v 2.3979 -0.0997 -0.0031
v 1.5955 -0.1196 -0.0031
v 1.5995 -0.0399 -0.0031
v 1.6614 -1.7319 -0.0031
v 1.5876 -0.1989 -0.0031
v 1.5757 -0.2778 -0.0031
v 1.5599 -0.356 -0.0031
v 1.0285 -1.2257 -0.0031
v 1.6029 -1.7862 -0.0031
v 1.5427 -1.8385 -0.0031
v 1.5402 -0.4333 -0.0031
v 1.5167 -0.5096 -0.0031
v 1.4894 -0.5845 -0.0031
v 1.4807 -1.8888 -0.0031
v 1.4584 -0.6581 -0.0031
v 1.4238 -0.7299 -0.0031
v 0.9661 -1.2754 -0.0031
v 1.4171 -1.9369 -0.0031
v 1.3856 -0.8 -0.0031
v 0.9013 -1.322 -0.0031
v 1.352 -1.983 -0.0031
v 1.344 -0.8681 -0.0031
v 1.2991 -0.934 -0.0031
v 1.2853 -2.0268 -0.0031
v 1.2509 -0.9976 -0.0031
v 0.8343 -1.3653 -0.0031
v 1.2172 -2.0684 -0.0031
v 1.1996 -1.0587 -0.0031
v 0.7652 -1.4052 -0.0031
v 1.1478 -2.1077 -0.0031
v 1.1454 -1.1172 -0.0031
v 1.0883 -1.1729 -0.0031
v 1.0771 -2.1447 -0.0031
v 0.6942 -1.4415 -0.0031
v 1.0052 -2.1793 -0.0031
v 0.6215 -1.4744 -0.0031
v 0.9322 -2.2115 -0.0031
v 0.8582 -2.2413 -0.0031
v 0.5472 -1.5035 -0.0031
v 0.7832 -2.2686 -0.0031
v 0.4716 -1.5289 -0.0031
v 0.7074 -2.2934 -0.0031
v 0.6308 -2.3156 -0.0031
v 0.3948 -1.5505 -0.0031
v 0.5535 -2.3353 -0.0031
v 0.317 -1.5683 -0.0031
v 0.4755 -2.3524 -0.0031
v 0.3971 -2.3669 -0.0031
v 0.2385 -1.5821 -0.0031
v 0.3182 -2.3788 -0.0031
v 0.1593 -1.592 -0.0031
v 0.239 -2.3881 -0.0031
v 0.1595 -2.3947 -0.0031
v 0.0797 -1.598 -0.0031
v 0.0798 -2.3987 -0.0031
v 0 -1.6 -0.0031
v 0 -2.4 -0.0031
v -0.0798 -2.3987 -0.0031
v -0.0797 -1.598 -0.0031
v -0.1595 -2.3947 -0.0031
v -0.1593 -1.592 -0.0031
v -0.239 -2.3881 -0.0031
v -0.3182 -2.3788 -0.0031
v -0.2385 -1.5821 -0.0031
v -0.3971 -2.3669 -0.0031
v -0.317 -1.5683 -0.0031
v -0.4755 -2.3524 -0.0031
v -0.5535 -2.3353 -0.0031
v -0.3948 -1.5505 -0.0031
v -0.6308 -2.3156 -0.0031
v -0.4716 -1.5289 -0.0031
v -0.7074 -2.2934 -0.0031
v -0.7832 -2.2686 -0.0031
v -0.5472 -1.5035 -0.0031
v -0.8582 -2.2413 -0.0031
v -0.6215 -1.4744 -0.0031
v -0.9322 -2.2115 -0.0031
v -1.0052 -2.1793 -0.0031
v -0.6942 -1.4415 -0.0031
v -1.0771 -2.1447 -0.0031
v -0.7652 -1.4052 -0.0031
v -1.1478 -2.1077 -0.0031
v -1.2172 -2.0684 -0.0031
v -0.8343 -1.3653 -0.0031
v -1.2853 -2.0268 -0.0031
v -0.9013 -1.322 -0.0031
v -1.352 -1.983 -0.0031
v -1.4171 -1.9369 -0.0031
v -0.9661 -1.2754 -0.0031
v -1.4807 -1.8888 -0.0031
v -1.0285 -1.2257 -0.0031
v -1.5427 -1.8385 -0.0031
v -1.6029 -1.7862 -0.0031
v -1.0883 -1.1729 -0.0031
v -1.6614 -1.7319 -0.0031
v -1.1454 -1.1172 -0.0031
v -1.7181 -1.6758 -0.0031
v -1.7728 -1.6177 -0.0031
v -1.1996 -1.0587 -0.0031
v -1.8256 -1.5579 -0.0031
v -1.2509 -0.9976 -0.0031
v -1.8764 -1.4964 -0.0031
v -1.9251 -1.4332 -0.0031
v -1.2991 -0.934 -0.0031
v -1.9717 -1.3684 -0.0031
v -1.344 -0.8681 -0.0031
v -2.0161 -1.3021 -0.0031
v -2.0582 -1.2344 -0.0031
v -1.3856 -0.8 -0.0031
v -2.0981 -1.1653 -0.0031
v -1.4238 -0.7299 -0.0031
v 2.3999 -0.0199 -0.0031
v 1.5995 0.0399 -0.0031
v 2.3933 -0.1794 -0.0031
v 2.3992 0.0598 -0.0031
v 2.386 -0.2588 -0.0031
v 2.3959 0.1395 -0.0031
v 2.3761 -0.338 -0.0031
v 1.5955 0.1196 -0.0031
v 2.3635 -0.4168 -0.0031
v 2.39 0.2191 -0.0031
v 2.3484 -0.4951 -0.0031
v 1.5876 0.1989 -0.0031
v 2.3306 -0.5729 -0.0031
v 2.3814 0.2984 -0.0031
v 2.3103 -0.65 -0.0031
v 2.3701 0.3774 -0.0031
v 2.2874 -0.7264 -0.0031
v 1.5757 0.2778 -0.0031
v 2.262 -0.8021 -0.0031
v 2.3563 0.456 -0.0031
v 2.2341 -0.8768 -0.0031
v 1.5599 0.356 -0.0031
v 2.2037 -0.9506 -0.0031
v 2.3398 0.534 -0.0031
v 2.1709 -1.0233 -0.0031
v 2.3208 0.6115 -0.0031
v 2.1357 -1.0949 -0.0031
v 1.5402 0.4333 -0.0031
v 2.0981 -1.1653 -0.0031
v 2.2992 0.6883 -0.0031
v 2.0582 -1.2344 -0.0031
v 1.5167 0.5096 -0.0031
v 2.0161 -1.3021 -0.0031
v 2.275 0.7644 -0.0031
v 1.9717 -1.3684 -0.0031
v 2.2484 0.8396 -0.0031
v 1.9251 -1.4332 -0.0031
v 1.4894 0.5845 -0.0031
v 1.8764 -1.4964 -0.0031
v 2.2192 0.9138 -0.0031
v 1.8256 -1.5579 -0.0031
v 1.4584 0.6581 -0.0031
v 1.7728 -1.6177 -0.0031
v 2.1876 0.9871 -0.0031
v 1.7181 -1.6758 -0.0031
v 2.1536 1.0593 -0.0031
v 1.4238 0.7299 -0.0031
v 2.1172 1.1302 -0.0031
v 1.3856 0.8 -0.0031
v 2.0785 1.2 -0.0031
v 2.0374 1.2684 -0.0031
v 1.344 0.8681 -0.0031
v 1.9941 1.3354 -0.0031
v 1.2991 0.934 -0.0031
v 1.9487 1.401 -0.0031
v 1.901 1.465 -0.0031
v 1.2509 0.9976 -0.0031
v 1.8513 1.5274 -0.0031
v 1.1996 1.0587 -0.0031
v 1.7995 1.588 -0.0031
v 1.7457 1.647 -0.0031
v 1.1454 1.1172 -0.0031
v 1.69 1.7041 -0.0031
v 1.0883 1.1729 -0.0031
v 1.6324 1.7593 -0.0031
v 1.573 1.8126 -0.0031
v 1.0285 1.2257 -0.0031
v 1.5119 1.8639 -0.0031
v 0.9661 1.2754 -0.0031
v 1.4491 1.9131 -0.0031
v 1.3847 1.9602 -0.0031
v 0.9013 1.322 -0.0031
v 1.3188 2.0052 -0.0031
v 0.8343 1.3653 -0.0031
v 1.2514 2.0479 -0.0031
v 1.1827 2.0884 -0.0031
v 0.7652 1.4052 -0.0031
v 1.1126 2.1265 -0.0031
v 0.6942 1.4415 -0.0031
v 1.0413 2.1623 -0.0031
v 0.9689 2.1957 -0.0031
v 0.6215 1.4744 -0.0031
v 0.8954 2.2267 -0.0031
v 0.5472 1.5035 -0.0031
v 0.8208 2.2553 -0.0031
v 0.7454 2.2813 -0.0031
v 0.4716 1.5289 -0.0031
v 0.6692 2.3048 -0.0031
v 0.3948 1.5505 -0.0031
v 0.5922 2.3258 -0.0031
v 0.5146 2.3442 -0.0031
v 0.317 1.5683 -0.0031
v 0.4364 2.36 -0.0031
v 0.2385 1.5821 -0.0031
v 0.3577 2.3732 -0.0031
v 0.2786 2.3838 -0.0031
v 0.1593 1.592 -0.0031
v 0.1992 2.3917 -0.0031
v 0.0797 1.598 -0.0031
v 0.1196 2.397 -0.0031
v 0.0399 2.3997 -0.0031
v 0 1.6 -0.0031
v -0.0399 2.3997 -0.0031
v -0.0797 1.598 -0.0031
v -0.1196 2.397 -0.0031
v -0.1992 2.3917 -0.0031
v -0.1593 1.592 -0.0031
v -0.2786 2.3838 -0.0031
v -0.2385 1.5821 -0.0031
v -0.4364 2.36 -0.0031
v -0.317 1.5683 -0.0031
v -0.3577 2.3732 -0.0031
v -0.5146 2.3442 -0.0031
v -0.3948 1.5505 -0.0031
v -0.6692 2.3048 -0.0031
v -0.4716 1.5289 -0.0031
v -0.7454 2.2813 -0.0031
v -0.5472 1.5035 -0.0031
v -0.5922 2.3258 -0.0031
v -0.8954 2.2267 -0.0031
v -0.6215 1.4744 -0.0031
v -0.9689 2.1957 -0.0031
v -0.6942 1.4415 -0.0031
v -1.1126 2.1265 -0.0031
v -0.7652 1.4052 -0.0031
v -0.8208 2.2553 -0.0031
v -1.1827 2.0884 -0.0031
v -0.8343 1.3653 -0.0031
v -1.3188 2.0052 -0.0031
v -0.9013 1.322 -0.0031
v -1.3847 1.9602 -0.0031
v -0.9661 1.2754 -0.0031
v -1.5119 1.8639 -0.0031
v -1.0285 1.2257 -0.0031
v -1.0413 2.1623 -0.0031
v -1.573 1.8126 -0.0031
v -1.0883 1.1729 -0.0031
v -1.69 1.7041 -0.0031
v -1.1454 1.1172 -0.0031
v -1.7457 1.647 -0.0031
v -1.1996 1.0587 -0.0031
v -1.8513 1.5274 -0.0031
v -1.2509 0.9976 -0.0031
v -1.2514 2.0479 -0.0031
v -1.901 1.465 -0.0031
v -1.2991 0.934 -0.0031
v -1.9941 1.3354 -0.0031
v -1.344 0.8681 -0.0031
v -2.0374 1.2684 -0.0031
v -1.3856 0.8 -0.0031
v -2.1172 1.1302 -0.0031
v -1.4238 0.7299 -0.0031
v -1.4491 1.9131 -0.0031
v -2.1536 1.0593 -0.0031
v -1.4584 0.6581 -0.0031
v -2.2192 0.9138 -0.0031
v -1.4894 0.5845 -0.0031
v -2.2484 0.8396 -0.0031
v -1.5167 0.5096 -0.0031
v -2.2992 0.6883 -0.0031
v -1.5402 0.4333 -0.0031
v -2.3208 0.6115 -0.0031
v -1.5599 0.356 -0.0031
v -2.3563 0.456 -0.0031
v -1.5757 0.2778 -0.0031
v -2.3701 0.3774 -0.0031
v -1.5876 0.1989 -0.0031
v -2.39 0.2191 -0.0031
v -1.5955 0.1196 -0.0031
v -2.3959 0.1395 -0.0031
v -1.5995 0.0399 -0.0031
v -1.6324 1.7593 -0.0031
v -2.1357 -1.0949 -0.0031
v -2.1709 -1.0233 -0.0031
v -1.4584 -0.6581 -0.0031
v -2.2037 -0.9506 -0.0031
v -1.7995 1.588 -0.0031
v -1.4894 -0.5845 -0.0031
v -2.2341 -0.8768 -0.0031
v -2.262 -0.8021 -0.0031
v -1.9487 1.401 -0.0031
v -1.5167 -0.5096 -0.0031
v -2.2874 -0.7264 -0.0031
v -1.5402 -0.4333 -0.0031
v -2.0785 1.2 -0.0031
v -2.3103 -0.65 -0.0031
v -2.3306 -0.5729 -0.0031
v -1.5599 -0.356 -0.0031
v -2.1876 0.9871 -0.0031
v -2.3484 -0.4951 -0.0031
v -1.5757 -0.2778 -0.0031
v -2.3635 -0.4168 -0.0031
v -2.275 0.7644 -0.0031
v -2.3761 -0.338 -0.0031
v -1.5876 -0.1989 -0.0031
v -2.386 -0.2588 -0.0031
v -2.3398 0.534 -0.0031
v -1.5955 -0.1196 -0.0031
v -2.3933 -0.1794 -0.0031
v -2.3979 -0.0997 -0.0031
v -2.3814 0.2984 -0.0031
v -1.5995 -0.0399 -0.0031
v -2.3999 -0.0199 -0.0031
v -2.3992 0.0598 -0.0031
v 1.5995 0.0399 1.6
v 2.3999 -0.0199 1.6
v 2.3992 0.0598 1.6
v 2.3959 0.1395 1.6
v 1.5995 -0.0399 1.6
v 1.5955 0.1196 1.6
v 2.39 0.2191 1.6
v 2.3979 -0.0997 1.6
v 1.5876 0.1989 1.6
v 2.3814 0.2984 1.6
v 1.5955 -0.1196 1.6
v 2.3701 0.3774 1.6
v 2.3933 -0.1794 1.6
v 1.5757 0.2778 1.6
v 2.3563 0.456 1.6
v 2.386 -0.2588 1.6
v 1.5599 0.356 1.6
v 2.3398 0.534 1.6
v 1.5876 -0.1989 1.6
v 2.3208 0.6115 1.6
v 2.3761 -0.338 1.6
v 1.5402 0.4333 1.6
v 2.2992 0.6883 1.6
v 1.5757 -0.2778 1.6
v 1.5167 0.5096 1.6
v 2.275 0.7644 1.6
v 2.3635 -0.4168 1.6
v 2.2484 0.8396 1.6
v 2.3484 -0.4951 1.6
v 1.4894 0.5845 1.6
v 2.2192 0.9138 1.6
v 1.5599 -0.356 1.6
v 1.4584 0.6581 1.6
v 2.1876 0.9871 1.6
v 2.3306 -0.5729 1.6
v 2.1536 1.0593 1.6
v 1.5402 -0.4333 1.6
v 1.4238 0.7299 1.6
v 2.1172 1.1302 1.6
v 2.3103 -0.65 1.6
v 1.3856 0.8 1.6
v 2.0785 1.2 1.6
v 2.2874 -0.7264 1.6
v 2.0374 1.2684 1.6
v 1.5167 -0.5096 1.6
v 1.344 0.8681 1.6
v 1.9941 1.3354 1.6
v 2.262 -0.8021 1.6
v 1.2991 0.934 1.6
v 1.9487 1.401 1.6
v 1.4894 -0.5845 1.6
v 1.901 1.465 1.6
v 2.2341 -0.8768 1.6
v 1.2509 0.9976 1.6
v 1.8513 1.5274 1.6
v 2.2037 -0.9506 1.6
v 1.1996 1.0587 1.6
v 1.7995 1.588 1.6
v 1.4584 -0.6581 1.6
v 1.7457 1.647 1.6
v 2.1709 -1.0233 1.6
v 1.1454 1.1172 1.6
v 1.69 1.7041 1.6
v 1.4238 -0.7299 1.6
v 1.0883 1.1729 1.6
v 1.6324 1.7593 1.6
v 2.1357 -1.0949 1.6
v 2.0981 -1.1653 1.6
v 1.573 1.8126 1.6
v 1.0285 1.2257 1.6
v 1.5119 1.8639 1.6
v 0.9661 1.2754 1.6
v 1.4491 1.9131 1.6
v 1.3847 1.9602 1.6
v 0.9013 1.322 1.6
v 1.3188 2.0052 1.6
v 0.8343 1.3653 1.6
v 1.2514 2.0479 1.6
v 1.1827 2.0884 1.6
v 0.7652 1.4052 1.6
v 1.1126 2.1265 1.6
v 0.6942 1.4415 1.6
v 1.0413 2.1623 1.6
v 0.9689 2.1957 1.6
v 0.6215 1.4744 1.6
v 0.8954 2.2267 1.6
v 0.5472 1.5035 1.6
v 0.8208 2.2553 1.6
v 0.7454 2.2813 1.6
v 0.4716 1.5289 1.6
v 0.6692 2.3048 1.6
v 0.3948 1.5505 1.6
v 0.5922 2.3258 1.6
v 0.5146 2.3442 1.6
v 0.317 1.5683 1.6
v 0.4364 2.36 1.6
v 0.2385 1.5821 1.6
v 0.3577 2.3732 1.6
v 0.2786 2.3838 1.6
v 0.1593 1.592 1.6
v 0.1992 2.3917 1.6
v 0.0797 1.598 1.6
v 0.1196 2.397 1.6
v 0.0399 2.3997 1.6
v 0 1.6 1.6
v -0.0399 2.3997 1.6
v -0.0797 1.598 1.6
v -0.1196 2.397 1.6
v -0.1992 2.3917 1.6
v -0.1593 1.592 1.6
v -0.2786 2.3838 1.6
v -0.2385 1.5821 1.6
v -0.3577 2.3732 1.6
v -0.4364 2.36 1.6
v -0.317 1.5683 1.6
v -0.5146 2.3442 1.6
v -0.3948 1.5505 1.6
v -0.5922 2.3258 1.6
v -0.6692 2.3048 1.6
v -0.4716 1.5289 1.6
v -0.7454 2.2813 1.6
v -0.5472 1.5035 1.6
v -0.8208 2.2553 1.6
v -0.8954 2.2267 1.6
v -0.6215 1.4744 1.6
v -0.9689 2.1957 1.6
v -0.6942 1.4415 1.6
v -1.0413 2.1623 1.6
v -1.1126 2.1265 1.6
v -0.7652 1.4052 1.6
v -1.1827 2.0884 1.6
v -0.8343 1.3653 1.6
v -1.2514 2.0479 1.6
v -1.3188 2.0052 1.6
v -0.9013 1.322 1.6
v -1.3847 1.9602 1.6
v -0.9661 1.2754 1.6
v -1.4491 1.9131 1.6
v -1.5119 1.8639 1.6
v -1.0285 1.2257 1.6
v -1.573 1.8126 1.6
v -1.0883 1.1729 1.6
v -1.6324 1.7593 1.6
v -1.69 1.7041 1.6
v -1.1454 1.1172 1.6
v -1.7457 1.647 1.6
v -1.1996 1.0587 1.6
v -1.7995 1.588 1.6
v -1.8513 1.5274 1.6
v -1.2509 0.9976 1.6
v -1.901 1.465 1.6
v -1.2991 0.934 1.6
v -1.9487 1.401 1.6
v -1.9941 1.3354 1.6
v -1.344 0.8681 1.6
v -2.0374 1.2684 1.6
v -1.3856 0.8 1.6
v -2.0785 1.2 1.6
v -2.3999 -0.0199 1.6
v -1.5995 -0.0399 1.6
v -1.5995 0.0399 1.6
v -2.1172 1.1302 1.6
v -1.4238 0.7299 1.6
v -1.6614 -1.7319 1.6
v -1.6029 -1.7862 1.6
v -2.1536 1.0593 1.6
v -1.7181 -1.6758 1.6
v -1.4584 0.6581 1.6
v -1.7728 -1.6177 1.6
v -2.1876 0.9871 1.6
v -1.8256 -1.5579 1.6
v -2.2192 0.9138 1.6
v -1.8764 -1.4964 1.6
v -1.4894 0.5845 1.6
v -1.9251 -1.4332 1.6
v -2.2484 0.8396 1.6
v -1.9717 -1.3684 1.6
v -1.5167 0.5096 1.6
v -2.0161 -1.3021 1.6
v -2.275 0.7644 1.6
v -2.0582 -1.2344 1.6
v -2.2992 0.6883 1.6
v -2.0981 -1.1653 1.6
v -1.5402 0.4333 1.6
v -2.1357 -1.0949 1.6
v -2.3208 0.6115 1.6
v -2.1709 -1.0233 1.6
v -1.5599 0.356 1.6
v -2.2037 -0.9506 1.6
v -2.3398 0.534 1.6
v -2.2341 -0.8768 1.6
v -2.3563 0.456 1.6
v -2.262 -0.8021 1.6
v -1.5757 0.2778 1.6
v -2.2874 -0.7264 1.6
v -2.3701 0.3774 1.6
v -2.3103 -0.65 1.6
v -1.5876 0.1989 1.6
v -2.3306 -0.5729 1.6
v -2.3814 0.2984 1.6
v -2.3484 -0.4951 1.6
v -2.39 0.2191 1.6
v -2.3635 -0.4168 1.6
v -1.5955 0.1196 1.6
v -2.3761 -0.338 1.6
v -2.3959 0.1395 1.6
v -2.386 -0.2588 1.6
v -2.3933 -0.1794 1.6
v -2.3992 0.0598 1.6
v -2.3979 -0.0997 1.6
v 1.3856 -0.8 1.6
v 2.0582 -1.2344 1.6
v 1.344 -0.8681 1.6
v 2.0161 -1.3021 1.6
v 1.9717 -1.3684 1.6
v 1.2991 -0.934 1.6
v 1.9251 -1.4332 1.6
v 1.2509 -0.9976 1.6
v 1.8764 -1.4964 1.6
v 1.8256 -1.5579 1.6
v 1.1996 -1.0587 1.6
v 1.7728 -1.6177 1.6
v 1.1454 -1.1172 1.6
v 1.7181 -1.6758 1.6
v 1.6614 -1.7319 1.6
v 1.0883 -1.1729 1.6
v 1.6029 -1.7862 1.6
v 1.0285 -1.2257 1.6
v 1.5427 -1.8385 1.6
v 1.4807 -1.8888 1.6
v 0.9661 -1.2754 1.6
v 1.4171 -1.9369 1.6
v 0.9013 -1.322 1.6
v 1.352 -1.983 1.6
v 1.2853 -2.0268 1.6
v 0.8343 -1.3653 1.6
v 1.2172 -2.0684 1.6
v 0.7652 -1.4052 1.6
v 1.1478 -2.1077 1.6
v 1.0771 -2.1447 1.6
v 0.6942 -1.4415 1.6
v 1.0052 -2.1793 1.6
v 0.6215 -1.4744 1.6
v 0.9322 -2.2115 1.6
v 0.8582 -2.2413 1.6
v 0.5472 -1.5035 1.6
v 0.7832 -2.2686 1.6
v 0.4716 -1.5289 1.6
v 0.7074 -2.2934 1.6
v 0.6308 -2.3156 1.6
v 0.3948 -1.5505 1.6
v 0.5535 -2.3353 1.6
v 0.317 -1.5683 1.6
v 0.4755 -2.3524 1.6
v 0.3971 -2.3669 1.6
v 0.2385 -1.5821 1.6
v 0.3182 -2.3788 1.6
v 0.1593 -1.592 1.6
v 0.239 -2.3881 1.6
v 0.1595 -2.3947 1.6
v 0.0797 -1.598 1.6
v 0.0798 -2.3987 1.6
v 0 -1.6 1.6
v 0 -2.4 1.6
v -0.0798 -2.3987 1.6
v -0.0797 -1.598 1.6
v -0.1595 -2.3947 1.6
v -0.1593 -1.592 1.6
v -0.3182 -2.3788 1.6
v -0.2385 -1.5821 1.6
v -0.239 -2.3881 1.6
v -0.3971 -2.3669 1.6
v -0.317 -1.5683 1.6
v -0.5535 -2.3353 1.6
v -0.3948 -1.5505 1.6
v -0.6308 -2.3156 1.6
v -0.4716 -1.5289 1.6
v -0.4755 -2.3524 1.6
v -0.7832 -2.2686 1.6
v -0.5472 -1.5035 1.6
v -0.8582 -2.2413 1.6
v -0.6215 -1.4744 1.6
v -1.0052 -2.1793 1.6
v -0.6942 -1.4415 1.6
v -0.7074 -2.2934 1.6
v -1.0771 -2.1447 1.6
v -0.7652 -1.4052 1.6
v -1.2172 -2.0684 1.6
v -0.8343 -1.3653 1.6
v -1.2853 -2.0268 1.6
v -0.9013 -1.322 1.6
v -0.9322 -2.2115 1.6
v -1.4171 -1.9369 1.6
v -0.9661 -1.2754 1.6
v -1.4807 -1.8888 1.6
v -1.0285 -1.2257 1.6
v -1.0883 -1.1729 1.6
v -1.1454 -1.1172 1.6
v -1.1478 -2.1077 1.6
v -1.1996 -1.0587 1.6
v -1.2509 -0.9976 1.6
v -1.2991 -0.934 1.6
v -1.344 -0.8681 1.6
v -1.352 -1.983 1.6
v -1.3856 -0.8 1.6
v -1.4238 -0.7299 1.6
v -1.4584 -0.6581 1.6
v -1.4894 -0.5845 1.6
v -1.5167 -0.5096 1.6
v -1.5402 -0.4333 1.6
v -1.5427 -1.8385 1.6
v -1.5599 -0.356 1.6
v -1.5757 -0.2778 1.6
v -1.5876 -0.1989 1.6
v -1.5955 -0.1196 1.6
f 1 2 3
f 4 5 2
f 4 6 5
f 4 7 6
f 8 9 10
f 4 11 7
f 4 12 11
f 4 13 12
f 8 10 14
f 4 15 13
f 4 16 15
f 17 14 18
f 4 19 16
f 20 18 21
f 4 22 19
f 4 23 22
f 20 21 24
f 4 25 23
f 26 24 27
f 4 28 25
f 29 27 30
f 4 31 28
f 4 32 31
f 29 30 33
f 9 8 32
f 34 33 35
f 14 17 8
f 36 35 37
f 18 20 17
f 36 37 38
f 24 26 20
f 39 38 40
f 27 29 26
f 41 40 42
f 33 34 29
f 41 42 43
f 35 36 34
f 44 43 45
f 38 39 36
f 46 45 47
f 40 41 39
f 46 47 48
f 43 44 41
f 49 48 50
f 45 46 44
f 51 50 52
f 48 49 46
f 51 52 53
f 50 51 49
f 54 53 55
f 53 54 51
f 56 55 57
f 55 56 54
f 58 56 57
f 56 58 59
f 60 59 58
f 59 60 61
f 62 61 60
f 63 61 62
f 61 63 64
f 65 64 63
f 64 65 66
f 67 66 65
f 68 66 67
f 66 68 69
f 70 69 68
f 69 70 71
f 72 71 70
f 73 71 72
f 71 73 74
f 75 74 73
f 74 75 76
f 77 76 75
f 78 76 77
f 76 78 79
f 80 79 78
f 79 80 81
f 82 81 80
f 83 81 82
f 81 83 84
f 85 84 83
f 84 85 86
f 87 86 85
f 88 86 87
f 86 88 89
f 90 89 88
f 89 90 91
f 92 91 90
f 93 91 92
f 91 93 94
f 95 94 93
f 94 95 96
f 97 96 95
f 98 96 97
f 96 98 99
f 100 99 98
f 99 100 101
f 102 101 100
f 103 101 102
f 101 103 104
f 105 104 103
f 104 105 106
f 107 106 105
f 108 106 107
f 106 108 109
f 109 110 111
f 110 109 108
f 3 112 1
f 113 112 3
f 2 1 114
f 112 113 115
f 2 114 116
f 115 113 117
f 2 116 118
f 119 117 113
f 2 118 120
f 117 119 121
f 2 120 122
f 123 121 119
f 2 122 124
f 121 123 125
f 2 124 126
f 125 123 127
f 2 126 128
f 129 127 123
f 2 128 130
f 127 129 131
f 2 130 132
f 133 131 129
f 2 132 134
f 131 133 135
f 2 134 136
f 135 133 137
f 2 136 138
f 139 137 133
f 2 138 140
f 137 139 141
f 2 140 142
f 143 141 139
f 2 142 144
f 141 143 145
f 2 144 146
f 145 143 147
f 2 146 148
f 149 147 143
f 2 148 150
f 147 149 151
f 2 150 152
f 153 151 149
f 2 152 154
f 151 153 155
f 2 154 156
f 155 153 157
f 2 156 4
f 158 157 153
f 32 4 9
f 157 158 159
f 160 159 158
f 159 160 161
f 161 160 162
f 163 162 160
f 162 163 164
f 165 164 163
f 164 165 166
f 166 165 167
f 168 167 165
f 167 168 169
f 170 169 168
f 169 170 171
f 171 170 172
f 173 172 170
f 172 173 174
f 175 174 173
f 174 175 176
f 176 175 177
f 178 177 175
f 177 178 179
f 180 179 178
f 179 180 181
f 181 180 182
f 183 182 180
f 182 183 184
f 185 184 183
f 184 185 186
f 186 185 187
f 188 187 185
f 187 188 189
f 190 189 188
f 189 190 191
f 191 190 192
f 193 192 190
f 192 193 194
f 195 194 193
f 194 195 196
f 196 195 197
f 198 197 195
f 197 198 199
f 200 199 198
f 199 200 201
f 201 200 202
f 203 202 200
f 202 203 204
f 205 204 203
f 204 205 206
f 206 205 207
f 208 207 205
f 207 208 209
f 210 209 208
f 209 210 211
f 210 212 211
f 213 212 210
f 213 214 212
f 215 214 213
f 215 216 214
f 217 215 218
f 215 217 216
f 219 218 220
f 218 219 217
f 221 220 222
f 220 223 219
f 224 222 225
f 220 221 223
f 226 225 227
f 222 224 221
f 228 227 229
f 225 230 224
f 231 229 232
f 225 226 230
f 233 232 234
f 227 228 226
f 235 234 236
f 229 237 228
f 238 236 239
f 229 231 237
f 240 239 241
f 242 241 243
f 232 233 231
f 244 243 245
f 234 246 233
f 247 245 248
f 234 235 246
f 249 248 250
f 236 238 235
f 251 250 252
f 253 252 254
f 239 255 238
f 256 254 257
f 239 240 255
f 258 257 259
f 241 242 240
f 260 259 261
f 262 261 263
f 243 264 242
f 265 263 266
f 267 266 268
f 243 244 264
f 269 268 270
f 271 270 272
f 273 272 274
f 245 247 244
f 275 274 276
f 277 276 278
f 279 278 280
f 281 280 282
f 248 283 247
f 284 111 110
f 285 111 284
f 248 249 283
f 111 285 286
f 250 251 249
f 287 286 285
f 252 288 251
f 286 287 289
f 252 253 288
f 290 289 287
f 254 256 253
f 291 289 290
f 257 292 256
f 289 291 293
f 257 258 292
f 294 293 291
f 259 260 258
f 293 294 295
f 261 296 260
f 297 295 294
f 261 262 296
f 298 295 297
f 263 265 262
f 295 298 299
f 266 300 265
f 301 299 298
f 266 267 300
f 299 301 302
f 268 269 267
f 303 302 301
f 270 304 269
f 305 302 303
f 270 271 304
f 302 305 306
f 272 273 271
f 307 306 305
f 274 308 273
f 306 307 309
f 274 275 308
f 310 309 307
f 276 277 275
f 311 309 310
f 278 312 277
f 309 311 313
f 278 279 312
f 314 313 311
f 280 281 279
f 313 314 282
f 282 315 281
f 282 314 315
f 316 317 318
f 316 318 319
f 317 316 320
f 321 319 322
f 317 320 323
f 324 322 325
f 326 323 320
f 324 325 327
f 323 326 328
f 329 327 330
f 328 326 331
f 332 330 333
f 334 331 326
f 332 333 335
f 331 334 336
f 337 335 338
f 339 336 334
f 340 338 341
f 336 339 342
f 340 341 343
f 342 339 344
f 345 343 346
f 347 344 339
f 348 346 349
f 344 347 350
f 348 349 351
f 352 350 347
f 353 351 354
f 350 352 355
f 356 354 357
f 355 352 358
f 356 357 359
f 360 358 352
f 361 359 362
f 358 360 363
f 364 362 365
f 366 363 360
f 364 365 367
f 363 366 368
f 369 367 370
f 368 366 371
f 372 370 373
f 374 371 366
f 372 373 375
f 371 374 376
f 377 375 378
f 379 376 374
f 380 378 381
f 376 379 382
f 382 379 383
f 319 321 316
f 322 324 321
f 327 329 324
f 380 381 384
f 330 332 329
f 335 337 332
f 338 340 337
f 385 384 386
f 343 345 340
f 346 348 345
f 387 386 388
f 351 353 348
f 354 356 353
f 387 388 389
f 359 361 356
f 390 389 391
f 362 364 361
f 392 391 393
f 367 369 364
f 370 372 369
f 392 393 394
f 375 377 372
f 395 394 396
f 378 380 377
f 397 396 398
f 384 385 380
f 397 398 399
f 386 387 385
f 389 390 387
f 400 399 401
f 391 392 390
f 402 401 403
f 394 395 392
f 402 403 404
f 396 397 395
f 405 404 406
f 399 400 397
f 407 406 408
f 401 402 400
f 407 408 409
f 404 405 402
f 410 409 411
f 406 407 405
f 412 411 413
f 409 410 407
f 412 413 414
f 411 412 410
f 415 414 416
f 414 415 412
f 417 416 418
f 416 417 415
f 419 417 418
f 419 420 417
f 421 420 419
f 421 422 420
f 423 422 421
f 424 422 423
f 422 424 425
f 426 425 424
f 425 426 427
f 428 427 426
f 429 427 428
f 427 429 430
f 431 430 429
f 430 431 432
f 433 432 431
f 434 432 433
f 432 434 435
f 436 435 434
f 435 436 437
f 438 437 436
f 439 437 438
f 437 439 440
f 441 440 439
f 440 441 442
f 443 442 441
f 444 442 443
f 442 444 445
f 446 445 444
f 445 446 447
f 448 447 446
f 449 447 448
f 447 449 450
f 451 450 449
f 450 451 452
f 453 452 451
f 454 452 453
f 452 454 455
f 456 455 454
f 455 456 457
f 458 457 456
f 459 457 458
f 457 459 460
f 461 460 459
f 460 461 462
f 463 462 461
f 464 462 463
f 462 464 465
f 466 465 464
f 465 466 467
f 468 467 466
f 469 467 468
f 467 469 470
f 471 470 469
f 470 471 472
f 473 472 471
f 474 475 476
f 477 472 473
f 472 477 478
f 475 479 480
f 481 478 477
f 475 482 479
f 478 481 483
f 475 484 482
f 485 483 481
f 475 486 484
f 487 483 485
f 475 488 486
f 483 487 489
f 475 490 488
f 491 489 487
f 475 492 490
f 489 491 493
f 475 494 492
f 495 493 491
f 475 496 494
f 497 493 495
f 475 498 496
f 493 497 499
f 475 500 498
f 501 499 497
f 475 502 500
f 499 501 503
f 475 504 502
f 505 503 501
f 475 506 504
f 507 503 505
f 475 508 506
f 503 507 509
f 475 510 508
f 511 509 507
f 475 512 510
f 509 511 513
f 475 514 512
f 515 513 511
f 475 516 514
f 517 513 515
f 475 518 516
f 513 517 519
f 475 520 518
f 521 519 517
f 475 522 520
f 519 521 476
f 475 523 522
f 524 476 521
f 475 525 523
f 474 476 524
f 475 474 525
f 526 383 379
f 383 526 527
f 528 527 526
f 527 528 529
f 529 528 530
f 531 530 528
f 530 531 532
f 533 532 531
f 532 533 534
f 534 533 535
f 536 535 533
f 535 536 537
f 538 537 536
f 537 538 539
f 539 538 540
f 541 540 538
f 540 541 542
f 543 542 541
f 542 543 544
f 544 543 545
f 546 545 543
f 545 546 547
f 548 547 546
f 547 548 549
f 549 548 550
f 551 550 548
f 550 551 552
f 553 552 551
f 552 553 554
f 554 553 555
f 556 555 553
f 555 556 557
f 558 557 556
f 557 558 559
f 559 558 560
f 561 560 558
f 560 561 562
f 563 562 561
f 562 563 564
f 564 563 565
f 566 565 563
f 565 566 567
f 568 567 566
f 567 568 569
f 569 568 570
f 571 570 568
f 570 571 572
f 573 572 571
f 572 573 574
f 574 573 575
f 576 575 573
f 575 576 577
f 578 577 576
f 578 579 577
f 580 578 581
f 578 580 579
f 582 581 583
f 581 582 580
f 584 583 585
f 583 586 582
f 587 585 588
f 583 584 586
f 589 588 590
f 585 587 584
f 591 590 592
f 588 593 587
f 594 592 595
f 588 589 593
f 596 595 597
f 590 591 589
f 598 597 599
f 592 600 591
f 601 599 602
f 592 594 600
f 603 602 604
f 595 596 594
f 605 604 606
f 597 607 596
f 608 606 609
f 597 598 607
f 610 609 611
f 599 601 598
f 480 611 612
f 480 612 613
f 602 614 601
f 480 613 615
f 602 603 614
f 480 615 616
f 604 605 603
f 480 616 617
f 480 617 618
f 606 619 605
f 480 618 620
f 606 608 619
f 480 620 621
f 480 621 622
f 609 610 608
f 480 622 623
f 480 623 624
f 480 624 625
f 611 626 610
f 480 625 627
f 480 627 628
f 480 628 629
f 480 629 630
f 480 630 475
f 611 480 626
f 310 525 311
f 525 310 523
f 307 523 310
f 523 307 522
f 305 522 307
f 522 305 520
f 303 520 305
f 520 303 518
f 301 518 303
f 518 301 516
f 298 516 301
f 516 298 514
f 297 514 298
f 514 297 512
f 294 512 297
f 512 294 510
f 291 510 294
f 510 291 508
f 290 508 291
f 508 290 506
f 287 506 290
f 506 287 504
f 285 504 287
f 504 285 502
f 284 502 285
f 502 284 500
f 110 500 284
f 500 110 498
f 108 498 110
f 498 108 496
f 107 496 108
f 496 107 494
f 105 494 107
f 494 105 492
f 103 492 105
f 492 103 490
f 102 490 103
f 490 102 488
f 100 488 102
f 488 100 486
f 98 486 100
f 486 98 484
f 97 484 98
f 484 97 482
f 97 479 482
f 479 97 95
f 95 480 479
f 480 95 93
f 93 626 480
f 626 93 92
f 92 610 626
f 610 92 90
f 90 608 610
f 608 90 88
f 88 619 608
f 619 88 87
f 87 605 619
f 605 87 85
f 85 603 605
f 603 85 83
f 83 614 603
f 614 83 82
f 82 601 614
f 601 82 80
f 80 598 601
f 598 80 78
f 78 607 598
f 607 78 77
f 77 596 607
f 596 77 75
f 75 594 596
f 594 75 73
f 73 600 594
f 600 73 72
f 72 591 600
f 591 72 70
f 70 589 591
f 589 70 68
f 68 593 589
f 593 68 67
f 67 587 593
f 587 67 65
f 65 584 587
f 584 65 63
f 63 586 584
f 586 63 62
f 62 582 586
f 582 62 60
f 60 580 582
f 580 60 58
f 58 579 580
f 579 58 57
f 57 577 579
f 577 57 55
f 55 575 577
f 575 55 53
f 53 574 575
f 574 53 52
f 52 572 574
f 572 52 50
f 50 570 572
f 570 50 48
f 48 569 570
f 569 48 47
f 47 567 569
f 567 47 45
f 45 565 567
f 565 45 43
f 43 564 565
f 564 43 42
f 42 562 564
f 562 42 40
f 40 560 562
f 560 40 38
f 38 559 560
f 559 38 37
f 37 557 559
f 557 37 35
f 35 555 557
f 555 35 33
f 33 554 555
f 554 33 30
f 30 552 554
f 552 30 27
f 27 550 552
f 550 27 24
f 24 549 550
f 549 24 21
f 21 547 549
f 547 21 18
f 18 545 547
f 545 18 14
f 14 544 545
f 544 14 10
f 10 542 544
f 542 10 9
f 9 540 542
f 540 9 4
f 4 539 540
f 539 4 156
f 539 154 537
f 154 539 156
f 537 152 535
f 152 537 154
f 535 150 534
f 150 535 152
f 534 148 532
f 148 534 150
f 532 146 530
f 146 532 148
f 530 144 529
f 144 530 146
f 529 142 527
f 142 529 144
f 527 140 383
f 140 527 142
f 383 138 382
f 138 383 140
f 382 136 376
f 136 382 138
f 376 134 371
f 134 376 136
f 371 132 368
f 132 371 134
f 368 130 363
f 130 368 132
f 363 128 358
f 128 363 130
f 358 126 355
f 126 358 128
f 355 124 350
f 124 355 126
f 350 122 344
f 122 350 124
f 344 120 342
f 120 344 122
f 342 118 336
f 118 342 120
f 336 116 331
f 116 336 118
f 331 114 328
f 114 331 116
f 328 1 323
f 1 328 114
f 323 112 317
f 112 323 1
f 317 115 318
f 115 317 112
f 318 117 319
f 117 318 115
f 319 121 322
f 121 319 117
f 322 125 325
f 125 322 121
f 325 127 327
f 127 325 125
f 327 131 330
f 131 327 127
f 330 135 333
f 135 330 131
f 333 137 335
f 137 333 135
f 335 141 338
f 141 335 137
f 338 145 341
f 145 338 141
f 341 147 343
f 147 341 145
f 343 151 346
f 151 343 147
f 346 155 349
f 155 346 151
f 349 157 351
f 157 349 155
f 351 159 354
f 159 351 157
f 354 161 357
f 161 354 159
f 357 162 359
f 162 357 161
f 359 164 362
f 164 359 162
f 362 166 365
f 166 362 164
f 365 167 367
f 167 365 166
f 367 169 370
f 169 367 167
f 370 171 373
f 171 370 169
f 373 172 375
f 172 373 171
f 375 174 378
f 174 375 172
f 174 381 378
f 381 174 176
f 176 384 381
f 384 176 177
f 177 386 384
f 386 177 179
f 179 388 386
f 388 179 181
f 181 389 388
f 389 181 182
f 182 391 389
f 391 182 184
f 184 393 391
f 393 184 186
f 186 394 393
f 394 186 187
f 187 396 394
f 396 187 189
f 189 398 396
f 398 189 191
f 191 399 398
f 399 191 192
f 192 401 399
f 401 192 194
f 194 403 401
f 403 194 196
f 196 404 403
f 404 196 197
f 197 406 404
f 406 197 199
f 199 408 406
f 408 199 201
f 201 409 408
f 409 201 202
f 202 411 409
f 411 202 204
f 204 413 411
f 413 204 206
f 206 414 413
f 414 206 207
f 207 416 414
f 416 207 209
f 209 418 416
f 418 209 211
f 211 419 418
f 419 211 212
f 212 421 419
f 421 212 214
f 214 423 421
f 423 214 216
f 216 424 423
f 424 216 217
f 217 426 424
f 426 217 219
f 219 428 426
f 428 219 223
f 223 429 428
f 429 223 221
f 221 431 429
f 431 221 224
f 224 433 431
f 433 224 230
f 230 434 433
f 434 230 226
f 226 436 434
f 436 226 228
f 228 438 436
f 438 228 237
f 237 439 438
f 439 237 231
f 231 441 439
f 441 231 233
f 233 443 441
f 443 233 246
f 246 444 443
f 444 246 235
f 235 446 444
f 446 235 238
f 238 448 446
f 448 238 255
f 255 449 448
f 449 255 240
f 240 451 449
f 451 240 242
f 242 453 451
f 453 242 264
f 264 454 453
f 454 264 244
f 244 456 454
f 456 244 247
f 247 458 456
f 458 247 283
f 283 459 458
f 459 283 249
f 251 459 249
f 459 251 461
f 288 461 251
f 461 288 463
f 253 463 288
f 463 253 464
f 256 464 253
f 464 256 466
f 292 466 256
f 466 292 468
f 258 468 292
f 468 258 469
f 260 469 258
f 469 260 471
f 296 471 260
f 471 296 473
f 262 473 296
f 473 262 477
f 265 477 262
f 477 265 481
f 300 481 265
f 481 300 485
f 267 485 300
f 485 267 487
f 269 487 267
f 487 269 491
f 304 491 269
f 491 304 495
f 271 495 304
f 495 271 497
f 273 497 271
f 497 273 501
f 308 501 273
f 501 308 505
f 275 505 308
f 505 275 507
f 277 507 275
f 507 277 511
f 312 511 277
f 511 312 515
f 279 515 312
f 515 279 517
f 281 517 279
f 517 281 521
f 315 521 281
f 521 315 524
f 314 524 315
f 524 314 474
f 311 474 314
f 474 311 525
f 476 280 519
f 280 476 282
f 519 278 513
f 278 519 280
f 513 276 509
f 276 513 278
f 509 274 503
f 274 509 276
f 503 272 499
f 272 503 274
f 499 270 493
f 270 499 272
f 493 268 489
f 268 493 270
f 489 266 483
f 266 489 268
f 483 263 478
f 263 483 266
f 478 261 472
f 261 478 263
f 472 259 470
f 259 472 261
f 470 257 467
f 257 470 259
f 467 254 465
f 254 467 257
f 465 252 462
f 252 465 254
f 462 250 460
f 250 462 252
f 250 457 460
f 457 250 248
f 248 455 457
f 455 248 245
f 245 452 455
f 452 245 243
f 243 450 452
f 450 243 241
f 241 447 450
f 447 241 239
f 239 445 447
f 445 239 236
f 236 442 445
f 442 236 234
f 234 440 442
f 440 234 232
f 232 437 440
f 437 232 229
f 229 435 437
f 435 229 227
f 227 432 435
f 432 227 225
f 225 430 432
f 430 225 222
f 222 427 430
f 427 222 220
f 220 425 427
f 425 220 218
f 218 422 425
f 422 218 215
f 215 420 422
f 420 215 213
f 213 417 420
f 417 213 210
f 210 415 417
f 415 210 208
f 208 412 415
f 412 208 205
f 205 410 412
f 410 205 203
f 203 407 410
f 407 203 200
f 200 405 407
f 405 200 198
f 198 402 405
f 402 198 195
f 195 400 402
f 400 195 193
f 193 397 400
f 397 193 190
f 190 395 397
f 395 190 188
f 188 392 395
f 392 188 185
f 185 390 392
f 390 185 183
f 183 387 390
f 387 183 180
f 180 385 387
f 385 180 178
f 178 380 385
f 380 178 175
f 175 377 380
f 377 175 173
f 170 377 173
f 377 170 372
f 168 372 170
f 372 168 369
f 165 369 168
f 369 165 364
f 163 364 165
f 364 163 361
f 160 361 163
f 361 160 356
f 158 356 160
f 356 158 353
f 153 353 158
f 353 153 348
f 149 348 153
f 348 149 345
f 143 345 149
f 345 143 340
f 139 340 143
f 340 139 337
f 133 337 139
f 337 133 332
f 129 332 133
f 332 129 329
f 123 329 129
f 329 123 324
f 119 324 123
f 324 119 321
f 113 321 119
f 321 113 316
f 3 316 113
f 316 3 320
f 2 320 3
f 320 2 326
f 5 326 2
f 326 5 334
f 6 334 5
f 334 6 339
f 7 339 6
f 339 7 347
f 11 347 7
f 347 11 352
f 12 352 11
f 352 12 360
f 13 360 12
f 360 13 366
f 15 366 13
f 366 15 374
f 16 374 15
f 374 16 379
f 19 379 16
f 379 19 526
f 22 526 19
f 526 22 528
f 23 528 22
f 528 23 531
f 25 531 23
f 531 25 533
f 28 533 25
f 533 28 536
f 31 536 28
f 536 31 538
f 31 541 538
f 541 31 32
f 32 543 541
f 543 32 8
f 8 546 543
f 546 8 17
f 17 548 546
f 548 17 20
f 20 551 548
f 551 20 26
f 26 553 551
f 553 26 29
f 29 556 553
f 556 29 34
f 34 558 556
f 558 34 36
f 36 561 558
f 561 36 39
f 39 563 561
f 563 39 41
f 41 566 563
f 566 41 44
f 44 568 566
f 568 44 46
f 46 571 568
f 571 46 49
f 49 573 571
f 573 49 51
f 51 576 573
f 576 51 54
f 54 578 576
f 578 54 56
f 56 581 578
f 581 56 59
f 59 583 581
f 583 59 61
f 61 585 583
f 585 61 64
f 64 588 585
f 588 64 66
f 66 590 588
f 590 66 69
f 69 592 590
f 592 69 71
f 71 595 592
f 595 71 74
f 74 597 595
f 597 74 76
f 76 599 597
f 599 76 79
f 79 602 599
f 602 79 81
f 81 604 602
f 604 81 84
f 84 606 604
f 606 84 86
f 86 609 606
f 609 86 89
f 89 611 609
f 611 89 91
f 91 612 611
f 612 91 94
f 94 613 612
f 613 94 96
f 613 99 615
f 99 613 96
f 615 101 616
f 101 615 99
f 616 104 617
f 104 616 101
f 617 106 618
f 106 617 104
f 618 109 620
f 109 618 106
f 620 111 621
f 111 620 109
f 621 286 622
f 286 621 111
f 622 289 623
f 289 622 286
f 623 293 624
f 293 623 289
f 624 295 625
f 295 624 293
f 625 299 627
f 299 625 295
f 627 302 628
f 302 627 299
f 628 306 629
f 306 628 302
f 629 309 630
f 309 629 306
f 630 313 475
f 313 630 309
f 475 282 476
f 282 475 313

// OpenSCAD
use <../lib.scad>
use <s/92262ph1s01.scad>
use <../p/stud2.scad>
$fa=1; $fs=0.2;
function ldraw_lib__92262ph1(realsolid=false) = [
// 0 Door  1 x  3 x  2 Left with Hollow Hinge with Horizontal White Line Pattern
// 0 Name: 92262ph1.dat
// 0 Author: Philip van Heemstra [BrickBaron]
// 0 !LDRAW_ORG Part UPDATE 2022-01
// 0 !LICENSE Licensed under CC BY 2.0 and CC BY 4.0 : see CAreadme.txt
// 
// 0 BFC CERTIFY CCW
  [0,"BFC","CERTIFY"],
  [0,"BFC","CCW"],
// 
// 0 !KEYWORDS Bricklink 92262pb004, Harry Potter, Set 75953, Set 75968
// 
// 0 !HISTORY 2022-01-14 [PTadmin] Official Update 2022-01
// 
// 
// 1 16 0 0 0 1 0 0 0 1 0 0 0 1 s\92262ph1s01.dat
  [1,16,0,0,0,1,0,0,0,1,0,0,0,1, ldraw_lib__s__92262ph1s01(realsolid)],
// 1 16 0 0 0 1 0 0 0 1 0 0 0 1 stud2.dat
  [1,16,0,0,0,1,0,0,0,1,0,0,0,1, ldraw_lib__stud2(realsolid)],
];
module ldraw_lib__92262ph1(step=0, col=false, unit=2/5, alt=false, line=0.2, solid=!$preview)
    makepoly(ldraw_lib__92262ph1(solid), step=step, col=col, unit=unit, alt=alt, line=line, solid=solid);
ldraw_lib__92262ph1(line=0.2);
